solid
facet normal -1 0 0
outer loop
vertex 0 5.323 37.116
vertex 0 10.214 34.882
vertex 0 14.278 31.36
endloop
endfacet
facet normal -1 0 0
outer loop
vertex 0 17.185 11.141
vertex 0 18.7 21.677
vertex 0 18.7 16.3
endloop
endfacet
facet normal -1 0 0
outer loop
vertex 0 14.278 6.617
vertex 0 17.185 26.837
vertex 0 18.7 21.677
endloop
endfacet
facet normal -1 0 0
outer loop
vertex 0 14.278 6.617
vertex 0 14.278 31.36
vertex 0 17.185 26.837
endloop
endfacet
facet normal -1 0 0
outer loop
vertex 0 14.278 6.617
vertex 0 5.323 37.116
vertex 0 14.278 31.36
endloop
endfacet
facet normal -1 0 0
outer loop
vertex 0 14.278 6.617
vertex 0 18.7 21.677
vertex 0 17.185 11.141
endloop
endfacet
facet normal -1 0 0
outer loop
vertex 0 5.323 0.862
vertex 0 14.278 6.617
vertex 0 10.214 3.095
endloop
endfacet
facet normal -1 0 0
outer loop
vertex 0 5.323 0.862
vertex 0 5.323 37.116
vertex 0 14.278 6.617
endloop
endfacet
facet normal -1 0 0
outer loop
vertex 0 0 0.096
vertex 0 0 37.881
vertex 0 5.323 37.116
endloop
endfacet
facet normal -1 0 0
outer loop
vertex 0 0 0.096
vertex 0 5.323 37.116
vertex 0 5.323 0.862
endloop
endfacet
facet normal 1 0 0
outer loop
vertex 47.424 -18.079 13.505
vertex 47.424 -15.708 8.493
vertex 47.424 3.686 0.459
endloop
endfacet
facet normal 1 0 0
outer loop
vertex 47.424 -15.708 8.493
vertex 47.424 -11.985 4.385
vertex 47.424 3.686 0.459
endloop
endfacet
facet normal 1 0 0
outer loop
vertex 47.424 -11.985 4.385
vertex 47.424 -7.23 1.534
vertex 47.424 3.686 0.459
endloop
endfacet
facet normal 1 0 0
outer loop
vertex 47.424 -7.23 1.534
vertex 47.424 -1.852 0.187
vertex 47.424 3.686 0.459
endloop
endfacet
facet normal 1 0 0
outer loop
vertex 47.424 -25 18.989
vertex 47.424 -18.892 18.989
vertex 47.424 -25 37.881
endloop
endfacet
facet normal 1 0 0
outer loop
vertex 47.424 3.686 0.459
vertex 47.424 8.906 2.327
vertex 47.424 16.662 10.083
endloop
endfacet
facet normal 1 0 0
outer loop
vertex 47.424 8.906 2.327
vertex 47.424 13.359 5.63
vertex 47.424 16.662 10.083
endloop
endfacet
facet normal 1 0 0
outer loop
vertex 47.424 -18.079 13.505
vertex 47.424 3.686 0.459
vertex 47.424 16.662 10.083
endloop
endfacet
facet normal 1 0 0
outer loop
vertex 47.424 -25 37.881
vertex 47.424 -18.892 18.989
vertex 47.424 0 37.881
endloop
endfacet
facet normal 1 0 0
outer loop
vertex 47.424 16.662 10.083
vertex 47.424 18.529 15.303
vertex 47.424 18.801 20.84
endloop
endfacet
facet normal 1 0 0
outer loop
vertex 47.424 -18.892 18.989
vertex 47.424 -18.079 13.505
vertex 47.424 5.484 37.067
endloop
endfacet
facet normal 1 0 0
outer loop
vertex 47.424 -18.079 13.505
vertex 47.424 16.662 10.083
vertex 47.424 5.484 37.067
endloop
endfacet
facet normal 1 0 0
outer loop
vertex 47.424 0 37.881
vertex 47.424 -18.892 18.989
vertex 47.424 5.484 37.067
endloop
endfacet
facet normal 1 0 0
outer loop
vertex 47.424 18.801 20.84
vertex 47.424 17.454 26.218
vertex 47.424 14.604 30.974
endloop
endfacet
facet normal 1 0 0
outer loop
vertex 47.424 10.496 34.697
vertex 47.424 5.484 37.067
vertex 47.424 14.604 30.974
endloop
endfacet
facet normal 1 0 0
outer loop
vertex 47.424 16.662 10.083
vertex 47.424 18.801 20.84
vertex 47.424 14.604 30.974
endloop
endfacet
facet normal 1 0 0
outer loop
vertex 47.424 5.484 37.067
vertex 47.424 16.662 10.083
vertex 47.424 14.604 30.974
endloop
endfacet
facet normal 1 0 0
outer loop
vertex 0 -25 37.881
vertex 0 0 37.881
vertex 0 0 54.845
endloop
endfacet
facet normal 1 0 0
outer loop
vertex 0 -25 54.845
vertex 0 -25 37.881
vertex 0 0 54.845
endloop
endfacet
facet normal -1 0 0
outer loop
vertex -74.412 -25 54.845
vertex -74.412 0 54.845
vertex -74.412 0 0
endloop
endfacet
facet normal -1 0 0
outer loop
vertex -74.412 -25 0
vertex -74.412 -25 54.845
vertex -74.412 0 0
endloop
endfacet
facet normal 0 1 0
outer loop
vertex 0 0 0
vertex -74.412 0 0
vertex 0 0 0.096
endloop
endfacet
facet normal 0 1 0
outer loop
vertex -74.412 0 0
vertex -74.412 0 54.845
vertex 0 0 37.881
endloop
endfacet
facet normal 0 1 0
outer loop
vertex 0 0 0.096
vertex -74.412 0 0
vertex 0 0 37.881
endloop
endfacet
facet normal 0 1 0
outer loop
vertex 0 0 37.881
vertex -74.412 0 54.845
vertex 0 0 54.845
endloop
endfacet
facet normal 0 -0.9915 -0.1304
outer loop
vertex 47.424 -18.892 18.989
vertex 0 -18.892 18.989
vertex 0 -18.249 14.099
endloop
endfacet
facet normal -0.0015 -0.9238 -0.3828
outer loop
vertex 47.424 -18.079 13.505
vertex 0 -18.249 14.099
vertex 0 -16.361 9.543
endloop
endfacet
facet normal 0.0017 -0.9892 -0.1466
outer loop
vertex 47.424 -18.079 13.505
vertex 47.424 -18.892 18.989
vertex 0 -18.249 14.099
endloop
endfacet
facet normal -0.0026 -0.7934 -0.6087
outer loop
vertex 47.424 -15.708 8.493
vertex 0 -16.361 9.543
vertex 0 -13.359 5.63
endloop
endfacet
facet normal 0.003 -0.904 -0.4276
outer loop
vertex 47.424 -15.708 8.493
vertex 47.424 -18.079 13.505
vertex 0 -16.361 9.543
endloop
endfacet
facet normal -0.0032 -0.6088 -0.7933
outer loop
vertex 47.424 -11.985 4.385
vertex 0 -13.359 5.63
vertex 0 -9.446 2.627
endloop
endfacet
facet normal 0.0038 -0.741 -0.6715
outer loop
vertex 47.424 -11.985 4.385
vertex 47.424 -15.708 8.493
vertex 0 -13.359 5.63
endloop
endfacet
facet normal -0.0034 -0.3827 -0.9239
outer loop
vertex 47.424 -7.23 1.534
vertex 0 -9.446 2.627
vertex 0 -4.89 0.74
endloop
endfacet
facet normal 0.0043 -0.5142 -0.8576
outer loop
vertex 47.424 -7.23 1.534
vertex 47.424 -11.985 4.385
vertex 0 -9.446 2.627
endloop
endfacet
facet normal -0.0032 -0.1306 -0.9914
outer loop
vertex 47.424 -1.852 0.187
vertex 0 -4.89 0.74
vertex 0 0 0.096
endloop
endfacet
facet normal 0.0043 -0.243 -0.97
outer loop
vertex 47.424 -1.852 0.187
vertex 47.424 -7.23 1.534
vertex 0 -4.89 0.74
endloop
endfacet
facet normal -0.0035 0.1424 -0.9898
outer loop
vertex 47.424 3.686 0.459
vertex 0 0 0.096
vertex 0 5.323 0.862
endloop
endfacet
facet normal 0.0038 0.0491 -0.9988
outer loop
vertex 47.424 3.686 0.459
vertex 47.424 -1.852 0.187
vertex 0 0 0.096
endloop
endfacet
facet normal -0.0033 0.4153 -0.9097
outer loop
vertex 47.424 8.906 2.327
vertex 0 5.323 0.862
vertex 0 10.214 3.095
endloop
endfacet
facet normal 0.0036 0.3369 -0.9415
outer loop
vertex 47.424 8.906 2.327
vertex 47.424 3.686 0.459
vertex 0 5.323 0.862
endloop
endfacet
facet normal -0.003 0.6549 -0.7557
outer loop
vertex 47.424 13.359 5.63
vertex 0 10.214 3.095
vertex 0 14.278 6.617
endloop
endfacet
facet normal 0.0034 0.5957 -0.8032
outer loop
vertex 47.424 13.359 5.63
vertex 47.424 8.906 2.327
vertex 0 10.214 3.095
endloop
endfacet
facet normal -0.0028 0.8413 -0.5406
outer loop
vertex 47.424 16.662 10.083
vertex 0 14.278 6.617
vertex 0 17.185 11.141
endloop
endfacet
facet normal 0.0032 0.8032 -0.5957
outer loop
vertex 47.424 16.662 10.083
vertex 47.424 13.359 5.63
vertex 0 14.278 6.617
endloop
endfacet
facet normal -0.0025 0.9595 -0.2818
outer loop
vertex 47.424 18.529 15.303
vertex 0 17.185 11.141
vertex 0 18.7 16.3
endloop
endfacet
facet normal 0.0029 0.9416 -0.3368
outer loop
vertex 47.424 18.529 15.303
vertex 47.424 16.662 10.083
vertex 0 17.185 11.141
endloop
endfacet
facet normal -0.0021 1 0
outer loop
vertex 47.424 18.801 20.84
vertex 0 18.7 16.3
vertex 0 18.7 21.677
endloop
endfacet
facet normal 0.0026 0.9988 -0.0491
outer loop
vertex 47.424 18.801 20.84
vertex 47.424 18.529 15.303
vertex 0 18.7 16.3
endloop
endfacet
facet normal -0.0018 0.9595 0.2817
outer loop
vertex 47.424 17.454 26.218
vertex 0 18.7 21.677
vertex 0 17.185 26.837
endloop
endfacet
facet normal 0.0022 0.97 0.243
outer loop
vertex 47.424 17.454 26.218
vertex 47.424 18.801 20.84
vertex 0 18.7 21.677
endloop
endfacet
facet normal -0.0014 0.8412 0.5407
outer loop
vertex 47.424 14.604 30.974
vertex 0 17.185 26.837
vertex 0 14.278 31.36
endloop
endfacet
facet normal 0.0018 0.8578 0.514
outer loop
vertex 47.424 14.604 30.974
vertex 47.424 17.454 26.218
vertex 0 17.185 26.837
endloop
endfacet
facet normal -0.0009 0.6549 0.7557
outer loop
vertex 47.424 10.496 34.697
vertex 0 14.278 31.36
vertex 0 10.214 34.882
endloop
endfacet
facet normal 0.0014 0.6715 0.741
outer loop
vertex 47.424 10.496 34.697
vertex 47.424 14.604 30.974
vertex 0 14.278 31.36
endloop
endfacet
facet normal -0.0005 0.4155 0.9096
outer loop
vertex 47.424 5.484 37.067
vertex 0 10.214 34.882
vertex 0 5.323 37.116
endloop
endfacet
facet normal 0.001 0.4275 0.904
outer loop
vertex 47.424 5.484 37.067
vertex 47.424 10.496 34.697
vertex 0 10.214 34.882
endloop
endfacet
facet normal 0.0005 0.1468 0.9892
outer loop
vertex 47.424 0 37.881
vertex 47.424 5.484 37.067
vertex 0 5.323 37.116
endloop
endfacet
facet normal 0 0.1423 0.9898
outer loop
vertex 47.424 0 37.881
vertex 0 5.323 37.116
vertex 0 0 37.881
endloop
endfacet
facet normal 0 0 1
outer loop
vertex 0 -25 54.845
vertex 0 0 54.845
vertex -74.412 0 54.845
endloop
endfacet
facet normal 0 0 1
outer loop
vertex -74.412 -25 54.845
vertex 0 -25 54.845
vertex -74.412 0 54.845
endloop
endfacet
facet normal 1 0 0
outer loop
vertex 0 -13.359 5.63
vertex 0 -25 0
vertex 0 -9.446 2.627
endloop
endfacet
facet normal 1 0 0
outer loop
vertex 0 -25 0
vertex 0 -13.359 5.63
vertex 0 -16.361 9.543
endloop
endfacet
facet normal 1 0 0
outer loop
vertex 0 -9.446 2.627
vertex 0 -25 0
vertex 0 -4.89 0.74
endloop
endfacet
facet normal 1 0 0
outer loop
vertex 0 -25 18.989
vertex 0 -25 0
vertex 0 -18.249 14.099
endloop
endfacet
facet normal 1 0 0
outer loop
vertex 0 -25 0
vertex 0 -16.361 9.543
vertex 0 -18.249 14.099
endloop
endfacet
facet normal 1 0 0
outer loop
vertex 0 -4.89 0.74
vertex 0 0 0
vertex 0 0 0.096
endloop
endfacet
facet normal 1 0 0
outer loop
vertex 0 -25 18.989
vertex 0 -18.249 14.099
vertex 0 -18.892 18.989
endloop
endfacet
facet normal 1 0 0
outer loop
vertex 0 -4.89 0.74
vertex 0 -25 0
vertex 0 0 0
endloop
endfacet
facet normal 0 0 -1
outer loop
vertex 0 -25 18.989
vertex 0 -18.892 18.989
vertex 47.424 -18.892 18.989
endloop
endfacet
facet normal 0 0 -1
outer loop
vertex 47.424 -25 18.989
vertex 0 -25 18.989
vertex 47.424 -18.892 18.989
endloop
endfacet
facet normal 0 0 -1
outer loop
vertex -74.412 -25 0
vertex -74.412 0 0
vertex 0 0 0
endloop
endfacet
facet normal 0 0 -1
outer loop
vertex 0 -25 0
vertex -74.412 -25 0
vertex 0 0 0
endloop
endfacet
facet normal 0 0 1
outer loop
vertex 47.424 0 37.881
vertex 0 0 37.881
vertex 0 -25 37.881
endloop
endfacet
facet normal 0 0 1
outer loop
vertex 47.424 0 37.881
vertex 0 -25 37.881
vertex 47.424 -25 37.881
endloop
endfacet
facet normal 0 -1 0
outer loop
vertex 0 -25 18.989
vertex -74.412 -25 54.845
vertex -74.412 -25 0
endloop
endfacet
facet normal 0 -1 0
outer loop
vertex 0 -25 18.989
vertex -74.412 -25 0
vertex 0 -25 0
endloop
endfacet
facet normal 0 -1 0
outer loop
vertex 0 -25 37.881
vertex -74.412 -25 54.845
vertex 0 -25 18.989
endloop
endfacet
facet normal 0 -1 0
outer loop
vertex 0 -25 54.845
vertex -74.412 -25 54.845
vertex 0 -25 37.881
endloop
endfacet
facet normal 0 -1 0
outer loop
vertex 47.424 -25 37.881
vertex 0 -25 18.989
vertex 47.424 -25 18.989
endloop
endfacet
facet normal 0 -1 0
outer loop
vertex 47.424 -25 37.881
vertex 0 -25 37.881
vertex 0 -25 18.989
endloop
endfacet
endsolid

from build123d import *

# Parameters (mm, degrees)
F0_W     = 47.423501
F0_H     = 18.892288
F2_DEPTH = 25


with BuildPart() as f1:
    # F0 (on Front) → F1 (revolve)
    with BuildSketch(Plane.XZ):
        with Locations((23.71175, 28.434824)):
            Rectangle(F0_W, F0_H)
    revolve(axis=Axis((23.71175, 0, 18.98868), (1, 0, 0)))

    # F0 (on Front) → F2 (join)
    with BuildSketch(Plane.XZ):
        Polygon((-74.412487, 54.845471), (-74.412487, 0), (0, 0), (0, 18.98868), (0, 37.880968), (0, 54.845471), align=None)
        with Locations((23.71175, 28.434824)):
            Rectangle(F0_W, F0_H)
    extrude(amount=F2_DEPTH)


solid = f1.part
